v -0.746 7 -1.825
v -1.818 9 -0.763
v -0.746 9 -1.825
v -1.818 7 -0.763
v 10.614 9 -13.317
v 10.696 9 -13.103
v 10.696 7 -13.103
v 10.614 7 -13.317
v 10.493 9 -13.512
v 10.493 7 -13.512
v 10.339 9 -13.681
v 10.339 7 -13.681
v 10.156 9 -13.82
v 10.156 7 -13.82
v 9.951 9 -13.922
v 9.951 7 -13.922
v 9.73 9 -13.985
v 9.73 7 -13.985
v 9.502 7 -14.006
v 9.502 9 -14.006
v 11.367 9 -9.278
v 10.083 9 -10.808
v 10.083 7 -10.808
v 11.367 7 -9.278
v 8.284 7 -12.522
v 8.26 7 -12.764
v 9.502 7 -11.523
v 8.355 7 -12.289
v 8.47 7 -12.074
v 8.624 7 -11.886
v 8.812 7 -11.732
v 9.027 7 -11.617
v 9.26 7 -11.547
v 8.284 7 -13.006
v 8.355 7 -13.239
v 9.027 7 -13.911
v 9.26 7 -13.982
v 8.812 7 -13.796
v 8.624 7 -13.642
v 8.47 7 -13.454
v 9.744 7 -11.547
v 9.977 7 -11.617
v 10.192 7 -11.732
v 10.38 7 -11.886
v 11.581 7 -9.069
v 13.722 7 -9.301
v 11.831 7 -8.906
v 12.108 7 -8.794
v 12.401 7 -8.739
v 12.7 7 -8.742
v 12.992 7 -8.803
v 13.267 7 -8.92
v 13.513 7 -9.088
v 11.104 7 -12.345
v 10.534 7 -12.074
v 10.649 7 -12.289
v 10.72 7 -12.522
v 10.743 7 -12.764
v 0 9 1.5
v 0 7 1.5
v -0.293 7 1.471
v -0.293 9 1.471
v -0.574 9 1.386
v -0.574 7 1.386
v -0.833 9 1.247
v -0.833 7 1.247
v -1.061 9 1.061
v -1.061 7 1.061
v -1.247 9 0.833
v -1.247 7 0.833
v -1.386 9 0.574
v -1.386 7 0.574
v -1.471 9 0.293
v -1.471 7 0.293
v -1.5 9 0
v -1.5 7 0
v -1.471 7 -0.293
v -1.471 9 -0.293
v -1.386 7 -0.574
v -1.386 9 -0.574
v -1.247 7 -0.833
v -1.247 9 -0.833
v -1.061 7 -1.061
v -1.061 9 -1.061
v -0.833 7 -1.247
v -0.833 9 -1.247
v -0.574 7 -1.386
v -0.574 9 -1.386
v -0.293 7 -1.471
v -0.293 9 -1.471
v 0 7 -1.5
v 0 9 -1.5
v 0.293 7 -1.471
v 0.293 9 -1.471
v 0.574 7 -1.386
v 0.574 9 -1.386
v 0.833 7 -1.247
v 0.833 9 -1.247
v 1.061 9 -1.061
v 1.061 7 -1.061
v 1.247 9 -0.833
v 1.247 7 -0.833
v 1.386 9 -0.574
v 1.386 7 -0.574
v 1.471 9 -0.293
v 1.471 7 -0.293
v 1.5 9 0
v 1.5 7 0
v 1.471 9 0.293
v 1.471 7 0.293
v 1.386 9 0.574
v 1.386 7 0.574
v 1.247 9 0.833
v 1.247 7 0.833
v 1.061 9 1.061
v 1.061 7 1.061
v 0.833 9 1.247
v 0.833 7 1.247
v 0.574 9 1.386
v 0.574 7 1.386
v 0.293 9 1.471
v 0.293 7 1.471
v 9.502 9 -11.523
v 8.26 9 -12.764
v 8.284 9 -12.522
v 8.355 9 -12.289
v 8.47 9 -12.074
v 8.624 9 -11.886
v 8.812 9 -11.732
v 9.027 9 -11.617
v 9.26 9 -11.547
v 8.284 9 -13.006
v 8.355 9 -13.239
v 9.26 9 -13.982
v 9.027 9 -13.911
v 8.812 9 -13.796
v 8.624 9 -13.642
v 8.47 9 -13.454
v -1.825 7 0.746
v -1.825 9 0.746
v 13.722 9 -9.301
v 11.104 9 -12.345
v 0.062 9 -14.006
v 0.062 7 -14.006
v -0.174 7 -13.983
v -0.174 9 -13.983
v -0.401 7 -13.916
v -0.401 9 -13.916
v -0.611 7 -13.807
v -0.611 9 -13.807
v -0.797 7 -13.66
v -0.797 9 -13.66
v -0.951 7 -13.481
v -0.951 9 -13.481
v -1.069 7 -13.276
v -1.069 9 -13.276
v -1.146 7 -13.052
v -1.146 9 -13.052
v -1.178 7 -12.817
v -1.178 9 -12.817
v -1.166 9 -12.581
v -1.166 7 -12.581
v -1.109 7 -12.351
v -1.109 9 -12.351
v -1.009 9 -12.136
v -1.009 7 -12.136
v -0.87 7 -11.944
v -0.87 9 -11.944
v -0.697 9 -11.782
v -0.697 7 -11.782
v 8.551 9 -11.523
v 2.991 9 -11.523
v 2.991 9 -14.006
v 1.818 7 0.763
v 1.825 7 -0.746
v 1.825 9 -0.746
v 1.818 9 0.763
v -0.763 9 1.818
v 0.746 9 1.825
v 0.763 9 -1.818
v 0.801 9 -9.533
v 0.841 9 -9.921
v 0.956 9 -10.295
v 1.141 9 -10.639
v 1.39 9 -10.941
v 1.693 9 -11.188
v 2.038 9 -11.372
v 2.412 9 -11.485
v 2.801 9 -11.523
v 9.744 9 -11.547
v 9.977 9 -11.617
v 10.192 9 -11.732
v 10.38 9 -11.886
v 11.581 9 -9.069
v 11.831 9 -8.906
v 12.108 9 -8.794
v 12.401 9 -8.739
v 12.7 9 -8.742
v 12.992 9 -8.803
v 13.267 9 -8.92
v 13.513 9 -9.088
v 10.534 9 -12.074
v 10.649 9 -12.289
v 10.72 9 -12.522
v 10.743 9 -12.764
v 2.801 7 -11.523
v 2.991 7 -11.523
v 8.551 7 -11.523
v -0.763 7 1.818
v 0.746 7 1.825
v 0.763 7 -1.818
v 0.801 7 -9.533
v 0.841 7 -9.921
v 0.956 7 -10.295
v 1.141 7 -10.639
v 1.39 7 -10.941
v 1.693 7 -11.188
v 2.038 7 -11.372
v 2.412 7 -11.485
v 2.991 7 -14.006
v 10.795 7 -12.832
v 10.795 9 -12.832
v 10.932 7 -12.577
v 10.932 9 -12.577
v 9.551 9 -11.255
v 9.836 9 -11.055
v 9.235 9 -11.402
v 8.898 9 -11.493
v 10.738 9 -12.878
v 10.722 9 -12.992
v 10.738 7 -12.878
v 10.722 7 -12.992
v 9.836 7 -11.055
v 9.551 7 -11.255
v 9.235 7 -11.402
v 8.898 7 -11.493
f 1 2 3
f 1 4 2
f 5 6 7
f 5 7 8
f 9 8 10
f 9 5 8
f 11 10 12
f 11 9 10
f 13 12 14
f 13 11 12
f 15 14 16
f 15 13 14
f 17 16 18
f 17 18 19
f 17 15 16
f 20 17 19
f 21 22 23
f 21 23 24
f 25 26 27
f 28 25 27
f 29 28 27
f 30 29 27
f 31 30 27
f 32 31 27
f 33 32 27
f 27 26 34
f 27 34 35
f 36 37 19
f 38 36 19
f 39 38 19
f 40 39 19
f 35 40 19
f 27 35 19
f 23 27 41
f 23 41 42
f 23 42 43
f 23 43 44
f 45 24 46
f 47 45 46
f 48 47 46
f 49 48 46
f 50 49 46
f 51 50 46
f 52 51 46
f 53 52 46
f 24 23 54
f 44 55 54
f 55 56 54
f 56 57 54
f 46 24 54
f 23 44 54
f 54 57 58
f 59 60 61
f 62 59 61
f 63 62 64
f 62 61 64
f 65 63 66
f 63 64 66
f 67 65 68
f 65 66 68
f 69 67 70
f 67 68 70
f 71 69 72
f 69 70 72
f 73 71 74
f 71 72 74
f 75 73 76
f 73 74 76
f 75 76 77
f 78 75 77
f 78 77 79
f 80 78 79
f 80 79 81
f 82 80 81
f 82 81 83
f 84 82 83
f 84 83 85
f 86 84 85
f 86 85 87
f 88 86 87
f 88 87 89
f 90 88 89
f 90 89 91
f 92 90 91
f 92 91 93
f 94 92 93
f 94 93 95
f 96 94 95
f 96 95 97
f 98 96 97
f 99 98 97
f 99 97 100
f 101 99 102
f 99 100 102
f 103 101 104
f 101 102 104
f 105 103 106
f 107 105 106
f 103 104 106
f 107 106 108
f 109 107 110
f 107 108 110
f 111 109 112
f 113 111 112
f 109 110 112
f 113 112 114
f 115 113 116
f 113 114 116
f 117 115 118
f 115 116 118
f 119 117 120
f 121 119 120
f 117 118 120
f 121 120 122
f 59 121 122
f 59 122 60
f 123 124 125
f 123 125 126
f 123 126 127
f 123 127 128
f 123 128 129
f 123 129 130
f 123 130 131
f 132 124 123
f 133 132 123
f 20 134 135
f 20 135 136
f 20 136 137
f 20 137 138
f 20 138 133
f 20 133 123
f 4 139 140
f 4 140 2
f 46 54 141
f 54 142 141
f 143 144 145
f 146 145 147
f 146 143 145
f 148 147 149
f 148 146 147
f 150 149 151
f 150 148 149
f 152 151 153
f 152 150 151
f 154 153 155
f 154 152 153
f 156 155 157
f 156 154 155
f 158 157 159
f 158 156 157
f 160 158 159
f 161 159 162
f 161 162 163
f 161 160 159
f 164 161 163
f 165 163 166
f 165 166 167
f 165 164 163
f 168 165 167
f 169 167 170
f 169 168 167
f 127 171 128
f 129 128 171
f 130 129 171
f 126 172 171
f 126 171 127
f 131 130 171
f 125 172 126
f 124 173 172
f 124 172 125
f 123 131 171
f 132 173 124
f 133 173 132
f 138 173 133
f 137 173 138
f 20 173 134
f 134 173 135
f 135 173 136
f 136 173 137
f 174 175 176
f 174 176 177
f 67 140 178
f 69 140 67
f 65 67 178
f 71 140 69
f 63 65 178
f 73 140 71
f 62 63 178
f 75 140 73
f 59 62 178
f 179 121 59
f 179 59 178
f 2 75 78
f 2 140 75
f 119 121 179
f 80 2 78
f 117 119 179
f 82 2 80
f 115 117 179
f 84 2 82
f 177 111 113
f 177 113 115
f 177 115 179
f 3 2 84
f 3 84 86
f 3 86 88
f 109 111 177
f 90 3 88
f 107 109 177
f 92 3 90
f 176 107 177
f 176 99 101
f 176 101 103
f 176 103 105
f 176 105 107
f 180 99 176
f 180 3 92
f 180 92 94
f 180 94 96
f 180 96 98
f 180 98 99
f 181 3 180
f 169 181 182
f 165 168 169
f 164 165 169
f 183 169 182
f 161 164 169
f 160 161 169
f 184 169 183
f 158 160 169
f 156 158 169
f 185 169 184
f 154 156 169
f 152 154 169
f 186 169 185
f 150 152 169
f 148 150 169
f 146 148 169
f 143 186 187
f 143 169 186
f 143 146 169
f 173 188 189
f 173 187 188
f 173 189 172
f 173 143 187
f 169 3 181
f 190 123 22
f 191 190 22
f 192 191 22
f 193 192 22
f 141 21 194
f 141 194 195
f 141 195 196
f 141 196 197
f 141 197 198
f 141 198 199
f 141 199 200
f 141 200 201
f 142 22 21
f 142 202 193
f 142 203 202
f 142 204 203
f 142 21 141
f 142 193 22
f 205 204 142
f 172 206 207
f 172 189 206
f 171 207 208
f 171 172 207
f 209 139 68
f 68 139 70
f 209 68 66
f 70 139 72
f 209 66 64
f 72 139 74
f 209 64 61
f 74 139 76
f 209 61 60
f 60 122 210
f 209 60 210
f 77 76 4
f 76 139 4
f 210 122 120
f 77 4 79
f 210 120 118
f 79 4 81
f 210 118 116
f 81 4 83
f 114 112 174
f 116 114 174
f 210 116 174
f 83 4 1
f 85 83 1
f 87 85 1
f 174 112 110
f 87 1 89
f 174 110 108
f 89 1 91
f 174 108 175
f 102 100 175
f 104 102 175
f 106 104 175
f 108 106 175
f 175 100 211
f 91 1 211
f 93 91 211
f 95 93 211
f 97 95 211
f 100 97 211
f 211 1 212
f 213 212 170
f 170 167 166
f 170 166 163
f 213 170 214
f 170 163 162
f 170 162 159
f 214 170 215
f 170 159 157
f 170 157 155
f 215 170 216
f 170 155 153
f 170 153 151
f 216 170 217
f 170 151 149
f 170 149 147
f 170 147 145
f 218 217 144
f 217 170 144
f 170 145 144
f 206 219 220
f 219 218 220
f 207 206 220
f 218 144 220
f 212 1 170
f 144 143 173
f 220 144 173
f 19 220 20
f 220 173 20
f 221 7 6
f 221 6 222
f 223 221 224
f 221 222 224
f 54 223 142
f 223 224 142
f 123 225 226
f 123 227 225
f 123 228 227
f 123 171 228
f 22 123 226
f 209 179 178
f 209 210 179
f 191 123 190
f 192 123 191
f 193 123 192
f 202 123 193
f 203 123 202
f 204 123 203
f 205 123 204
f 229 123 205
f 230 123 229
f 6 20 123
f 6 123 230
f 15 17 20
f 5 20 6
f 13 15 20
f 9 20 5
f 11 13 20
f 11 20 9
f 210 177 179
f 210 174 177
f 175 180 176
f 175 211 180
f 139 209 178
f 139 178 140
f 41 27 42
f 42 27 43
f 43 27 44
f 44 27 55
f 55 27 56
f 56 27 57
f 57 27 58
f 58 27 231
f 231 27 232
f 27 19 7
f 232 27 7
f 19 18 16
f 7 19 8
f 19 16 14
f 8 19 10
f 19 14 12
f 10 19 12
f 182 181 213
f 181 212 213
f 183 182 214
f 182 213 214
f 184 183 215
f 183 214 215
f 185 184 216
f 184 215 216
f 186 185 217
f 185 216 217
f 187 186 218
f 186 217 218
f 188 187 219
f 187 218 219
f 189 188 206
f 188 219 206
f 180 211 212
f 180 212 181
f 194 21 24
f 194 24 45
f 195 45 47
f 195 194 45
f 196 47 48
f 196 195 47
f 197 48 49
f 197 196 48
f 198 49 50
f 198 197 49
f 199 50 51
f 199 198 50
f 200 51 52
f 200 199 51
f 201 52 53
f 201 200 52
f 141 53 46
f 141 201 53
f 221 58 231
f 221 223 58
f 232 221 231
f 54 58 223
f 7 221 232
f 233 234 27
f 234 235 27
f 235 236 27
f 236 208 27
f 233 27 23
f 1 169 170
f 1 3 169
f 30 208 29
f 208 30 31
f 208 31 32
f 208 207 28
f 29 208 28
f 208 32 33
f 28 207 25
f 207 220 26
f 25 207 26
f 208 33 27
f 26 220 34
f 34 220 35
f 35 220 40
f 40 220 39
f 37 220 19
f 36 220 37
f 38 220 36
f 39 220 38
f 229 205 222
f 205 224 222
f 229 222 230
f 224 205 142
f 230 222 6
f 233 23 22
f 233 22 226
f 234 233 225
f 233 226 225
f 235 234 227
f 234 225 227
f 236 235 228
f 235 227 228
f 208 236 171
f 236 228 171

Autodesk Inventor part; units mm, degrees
ref_plane "Work Plane1" through (0, 7, 0) normal (0, 1, 0) x (1, 0, 0)
sketch "Sketch3" plane through (0, 7, 0) normal (0, 1, 0) x (1, 0, 0)
  line L0 (1.8253, 0.7457) -> (1.818, -0.7634)
  line L1 (1.818, -0.7634) -> (0.7457, -1.8253)
  line L2 (0.7457, -1.8253) -> (-0.7634, -1.818)
  line L3 (-0.7634, -1.818) -> (-1.8253, -0.7457)
  line L4 (-1.8253, -0.7457) -> (-1.818, 0.7634)
  line L5 (-1.818, 0.7634) -> (-0.7457, 1.8253)
  line L6 (-0.7457, 1.8253) -> (0.7634, 1.818)
  line L7 (0.7634, 1.818) -> (1.8253, 0.7457)
  line L8 (-1.8216, 0.0088) -> (1.8216, -0.0088) construction
  line L9 (-0.0088, -1.8216) -> (0.0088, 1.8216) construction
  point P0 (0, 0)
  point P1 (0, 0)
  point P2 (0, 0)
  point P3 (0, 0)
extrude "Extrusion2" add sketch "Sketch3" along normal blind 2
ref_plane "Work Plane2" through (-0.7457, 7, -1.8253) normal (0.0048553, 0, -0.9999882) x (-0.9999882, 0, -0.0048553)
sketch "Sketch4" plane through (-0.7457, 7, -1.8253) normal (0.0048553, 0, -0.9999882) x (-0.9999882, 0, -0.0048553)
  line L0 (-1.5091, 2) -> (0, 2)
  line L1 (0, 2) -> (0, 0)
  line L2 (0, 0) -> (-1.5091, 0)
  line L3 (-1.5091, 0) -> (-1.5091, 2)
  point P0 (-0.7546, -7)
extrude "Extrusion3" add sketch "Sketch4" along normal blind 10
sketch "Sketch5" plane through (0, 9, 0) normal (0, 1, 0) x (1, 0, 0)
  point P0 (0, 0)
sketch "Sketch6" plane through (0, 9, 0) normal (0, 1, 0) x (1, 0, 0)
  point P0 (0, 0)
sketch "Sketch7" plane through (0, 9, 0) normal (0, 1, 0) x (1, 0, 0)
  circle A0 centre (0.062, 12.7642) radius 1.2414
  point P0 (0, 0)
extrude "Extrusion4" add sketch "Sketch7" against normal blind 2
sketch "Sketch8" plane through (0, 9, 0) normal (0, 1, 0) x (1, 0, 0)
  point P0 (0, 0)
sketch "Sketch9" plane through (0, 9, 0) normal (0, 1, 0) x (1, 0, 0)
  point P0 (0, 0)
sketch "Sketch11" plane through (0, 9, 0) normal (0, 1, 0) x (1, 0, 0)
  point P0 (0, 0)
sketch "Sketch12" plane through (0, 9, 0) normal (0, 1, 0) x (1, 0, 0)
  point P0 (0, 0)
ref_plane "Work Plane3" through (0, 9, 0) normal (0, 1, 0) x (1, 0, 0)
sketch "Sketch13" plane through (0, 9, 0) normal (0, 1, 0) x (1, 0, 0)
  line L0 (0.062, 11.5229) -> (9.5019, 11.5229)
  line L1 (0.062, 11.5229) -> (0.062, 14.0056)
  arc A0 (0.8117, 11.7749) -> (-0.6974, 11.7822) centre (0.062, 12.7642) ccw projected
  line L2 (0.062, 14.0056) -> (9.5019, 14.0056)
  line L3 (9.5019, 11.5229) -> (9.5019, 14.0056)
  point P0 (0, 0)
extrude "Extrusion6" add sketch "Sketch13" against normal blind 2
ref_plane "Work Plane4" through (0, 9, 0) normal (0, 1, 0) x (1, 0, 0)
sketch "Sketch14" plane through (0, 9, 0) normal (0, 1, 0) x (1, 0, 0)
  line L0 (9.5019, 14.0056) -> (9.5019, 11.5229) projected
  circle A0 centre (9.5019, 12.7642) radius 1.2415
  point P0 (0, 0)
  dimension "d17" = 2.483
extrude "Extrusion7" add sketch "Sketch14" against normal blind 2
ref_plane "Work Plane5" through (0, 9, 0) normal (0, 1, 0) x (1, 0, 0)
sketch "Sketch15" plane through (0, 9, 0) normal (0, 1, 0) x (1, 0, 0)
  arc A0 (9.4834, 11.5229) -> (9.4834, 14.0056) centre (9.5019, 12.7642) ccw projected
  line L0 (10.7434, 12.7642) -> (13.7224, 9.3009)
  line L1 (9.4834, 11.5229) -> (11.3674, 9.2776)
  line L2 (9.4834, 11.5229) -> (12.4144, 11.5229) construction
  arc A1 (11.3674, 9.2776) -> (13.7224, 9.3009) centre (12.5353, 10.2576) ccw
  point P0 (0, 0)
  dimension "d20" = 50
extrude "Extrusion8" add sketch "Sketch15" against normal blind 2
sketch "Sketch16" plane through (0, 9, 0) normal (0, 1, 0) x (1, 0, 0)
  point P0 (0, 0)
hole "Hole1" at (0, 9, 0) direction (0, -1, 0) diameter 3 end through all
thread "Thread2" size "M3x0.5" class "6H" standard "ANSI Metric M Profile" full length
fillet "Fillet1" radius 2 1 edges at (0.8105, 8, -11.5229)
fillet "Fillet2" radius 2 1 edges at (9.5019, 8, -11.5229)
fillet "Fillet3" radius 2 1 edges at (10.7434, 8, -12.7642)
properties part number "Servo_Arm_Hook_F"
